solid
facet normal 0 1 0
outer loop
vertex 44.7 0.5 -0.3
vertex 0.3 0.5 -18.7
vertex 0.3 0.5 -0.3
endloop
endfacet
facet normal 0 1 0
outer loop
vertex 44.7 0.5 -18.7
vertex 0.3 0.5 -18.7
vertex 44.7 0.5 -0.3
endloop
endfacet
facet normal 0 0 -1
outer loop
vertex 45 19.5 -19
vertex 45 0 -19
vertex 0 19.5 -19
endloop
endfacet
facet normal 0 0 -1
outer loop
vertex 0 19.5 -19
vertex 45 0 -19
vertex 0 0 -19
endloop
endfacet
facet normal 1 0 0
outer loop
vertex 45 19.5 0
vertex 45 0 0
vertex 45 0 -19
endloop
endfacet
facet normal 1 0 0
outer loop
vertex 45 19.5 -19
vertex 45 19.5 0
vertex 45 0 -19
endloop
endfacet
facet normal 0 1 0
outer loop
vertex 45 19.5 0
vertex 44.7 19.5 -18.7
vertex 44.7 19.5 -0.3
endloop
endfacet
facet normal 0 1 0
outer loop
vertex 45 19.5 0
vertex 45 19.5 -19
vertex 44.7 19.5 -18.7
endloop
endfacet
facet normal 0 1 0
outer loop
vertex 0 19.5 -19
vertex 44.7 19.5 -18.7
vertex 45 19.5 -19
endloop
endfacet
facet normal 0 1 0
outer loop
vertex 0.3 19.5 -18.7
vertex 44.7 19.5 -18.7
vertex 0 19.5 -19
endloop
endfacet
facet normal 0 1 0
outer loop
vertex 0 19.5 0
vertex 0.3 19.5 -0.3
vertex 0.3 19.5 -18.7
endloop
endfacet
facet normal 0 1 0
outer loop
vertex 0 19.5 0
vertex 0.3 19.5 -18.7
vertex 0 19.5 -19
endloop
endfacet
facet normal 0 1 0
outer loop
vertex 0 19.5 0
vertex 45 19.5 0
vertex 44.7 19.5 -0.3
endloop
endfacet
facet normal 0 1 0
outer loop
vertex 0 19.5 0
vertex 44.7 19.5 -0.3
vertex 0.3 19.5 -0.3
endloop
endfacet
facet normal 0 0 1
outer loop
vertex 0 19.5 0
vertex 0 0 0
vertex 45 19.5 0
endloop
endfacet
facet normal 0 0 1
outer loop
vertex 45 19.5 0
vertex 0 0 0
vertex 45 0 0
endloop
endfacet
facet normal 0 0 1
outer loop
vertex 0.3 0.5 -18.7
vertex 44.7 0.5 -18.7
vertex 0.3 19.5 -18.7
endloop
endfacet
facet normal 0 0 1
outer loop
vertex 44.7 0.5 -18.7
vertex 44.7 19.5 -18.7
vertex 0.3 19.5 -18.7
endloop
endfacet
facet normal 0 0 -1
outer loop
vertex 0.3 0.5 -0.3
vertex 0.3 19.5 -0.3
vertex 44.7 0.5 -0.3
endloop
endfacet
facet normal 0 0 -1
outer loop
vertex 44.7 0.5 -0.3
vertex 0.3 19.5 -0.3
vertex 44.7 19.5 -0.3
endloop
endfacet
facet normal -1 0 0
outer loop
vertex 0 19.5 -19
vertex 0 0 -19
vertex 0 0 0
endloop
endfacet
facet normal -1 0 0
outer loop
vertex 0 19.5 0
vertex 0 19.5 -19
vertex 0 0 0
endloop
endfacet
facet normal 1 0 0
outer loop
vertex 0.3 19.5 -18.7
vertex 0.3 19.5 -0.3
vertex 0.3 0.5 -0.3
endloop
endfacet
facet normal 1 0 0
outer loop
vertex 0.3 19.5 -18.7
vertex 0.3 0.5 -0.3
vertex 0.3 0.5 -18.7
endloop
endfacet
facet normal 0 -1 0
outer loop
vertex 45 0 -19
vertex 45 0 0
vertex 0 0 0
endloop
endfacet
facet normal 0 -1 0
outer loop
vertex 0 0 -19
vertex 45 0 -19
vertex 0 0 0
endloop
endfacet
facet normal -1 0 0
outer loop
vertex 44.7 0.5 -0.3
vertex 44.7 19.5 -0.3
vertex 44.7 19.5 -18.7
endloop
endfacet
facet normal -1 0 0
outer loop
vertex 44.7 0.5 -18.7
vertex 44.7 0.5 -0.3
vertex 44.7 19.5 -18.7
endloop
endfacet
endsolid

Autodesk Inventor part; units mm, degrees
ref_plane "YZ Plane" through (0, 0, 0) normal (1, 0, 0) x (0, 1, 0)
ref_plane "XZ Plane" through (0, 0, 0) normal (0, 1, 0) x (-1, 0, 0)
ref_plane "XY Plane" through (0, 0, 0) normal (0, 0, 1) x (1, 0, 0)
sketch "Boceto1" plane through (0, 0, 0) normal (0, 1, 0) x (-1, 0, 0)
  line L0 (0, 0) -> (-45, 0)
  line L1 (-45, 0) -> (-45, -19)
  line L2 (-45, -19) -> (0, -19)
  line L3 (0, -19) -> (0, 0)
extrude "Extrusión1" add sketch "Boceto1" along normal blind 19.5
sketch "Boceto2" plane through (0, 19.5, 0) normal (0, 1, 0) x (1, 0, 0)
  line L0 (0, 19) -> (0, 0) projected
  line L1 (45, 0) -> (45, 19) projected
  line L2 (0, 0) -> (45, 0) projected
  line L3 (45, 19) -> (0, 19) projected
  line L4 (0.3, 0.3) -> (0.3, 9.5)
  line L5 (0.3, 0.3) -> (12.3526, 0.3)
  line L6 (0.3, 9.5) -> (0.3, 18.7)
  line L7 (0.3, 18.7) -> (13.3767, 18.7)
  line L8 (13.3767, 18.7) -> (25.3714, 18.7)
  line L9 (25.3714, 18.7) -> (38.8857, 18.7)
  line L10 (44.7, 0.3) -> (44.7, 18.7)
  line L11 (44.7, 18.7) -> (38.8857, 18.7)
  line L12 (44.7, 0.3) -> (33.7568, 0.3)
  line L13 (12.3526, 0.3) -> (33.7568, 0.3)
extrude "Extrusión2" cut sketch "Boceto2" against normal blind 19 contours L4 L6 L7 L8 L9 L11 L10 L12 L13 L5
equation "\"Radio_pliegue\" = Grosor"
equation "\"Anchura_desahogo_plegado\" = Grosor"
equation "\"Profundidad_desahogo_plegado\" = 0.5 * Grosor"
equation "\"Tamaño_destalonado\" = 4 * Grosor"
equation "\"Remanente_mínimo\" = 2 * Grosor"
equation "\"Radiodetransición\" = Radio_pliegue"
equation "\"Tamaño_de_radio_de_Jacobi\" = Radio_pliegue"
equation "\"TamañoSeparación\" = Grosor"
equation "\"Grosor\" = 0.5"
properties part number "caja"
